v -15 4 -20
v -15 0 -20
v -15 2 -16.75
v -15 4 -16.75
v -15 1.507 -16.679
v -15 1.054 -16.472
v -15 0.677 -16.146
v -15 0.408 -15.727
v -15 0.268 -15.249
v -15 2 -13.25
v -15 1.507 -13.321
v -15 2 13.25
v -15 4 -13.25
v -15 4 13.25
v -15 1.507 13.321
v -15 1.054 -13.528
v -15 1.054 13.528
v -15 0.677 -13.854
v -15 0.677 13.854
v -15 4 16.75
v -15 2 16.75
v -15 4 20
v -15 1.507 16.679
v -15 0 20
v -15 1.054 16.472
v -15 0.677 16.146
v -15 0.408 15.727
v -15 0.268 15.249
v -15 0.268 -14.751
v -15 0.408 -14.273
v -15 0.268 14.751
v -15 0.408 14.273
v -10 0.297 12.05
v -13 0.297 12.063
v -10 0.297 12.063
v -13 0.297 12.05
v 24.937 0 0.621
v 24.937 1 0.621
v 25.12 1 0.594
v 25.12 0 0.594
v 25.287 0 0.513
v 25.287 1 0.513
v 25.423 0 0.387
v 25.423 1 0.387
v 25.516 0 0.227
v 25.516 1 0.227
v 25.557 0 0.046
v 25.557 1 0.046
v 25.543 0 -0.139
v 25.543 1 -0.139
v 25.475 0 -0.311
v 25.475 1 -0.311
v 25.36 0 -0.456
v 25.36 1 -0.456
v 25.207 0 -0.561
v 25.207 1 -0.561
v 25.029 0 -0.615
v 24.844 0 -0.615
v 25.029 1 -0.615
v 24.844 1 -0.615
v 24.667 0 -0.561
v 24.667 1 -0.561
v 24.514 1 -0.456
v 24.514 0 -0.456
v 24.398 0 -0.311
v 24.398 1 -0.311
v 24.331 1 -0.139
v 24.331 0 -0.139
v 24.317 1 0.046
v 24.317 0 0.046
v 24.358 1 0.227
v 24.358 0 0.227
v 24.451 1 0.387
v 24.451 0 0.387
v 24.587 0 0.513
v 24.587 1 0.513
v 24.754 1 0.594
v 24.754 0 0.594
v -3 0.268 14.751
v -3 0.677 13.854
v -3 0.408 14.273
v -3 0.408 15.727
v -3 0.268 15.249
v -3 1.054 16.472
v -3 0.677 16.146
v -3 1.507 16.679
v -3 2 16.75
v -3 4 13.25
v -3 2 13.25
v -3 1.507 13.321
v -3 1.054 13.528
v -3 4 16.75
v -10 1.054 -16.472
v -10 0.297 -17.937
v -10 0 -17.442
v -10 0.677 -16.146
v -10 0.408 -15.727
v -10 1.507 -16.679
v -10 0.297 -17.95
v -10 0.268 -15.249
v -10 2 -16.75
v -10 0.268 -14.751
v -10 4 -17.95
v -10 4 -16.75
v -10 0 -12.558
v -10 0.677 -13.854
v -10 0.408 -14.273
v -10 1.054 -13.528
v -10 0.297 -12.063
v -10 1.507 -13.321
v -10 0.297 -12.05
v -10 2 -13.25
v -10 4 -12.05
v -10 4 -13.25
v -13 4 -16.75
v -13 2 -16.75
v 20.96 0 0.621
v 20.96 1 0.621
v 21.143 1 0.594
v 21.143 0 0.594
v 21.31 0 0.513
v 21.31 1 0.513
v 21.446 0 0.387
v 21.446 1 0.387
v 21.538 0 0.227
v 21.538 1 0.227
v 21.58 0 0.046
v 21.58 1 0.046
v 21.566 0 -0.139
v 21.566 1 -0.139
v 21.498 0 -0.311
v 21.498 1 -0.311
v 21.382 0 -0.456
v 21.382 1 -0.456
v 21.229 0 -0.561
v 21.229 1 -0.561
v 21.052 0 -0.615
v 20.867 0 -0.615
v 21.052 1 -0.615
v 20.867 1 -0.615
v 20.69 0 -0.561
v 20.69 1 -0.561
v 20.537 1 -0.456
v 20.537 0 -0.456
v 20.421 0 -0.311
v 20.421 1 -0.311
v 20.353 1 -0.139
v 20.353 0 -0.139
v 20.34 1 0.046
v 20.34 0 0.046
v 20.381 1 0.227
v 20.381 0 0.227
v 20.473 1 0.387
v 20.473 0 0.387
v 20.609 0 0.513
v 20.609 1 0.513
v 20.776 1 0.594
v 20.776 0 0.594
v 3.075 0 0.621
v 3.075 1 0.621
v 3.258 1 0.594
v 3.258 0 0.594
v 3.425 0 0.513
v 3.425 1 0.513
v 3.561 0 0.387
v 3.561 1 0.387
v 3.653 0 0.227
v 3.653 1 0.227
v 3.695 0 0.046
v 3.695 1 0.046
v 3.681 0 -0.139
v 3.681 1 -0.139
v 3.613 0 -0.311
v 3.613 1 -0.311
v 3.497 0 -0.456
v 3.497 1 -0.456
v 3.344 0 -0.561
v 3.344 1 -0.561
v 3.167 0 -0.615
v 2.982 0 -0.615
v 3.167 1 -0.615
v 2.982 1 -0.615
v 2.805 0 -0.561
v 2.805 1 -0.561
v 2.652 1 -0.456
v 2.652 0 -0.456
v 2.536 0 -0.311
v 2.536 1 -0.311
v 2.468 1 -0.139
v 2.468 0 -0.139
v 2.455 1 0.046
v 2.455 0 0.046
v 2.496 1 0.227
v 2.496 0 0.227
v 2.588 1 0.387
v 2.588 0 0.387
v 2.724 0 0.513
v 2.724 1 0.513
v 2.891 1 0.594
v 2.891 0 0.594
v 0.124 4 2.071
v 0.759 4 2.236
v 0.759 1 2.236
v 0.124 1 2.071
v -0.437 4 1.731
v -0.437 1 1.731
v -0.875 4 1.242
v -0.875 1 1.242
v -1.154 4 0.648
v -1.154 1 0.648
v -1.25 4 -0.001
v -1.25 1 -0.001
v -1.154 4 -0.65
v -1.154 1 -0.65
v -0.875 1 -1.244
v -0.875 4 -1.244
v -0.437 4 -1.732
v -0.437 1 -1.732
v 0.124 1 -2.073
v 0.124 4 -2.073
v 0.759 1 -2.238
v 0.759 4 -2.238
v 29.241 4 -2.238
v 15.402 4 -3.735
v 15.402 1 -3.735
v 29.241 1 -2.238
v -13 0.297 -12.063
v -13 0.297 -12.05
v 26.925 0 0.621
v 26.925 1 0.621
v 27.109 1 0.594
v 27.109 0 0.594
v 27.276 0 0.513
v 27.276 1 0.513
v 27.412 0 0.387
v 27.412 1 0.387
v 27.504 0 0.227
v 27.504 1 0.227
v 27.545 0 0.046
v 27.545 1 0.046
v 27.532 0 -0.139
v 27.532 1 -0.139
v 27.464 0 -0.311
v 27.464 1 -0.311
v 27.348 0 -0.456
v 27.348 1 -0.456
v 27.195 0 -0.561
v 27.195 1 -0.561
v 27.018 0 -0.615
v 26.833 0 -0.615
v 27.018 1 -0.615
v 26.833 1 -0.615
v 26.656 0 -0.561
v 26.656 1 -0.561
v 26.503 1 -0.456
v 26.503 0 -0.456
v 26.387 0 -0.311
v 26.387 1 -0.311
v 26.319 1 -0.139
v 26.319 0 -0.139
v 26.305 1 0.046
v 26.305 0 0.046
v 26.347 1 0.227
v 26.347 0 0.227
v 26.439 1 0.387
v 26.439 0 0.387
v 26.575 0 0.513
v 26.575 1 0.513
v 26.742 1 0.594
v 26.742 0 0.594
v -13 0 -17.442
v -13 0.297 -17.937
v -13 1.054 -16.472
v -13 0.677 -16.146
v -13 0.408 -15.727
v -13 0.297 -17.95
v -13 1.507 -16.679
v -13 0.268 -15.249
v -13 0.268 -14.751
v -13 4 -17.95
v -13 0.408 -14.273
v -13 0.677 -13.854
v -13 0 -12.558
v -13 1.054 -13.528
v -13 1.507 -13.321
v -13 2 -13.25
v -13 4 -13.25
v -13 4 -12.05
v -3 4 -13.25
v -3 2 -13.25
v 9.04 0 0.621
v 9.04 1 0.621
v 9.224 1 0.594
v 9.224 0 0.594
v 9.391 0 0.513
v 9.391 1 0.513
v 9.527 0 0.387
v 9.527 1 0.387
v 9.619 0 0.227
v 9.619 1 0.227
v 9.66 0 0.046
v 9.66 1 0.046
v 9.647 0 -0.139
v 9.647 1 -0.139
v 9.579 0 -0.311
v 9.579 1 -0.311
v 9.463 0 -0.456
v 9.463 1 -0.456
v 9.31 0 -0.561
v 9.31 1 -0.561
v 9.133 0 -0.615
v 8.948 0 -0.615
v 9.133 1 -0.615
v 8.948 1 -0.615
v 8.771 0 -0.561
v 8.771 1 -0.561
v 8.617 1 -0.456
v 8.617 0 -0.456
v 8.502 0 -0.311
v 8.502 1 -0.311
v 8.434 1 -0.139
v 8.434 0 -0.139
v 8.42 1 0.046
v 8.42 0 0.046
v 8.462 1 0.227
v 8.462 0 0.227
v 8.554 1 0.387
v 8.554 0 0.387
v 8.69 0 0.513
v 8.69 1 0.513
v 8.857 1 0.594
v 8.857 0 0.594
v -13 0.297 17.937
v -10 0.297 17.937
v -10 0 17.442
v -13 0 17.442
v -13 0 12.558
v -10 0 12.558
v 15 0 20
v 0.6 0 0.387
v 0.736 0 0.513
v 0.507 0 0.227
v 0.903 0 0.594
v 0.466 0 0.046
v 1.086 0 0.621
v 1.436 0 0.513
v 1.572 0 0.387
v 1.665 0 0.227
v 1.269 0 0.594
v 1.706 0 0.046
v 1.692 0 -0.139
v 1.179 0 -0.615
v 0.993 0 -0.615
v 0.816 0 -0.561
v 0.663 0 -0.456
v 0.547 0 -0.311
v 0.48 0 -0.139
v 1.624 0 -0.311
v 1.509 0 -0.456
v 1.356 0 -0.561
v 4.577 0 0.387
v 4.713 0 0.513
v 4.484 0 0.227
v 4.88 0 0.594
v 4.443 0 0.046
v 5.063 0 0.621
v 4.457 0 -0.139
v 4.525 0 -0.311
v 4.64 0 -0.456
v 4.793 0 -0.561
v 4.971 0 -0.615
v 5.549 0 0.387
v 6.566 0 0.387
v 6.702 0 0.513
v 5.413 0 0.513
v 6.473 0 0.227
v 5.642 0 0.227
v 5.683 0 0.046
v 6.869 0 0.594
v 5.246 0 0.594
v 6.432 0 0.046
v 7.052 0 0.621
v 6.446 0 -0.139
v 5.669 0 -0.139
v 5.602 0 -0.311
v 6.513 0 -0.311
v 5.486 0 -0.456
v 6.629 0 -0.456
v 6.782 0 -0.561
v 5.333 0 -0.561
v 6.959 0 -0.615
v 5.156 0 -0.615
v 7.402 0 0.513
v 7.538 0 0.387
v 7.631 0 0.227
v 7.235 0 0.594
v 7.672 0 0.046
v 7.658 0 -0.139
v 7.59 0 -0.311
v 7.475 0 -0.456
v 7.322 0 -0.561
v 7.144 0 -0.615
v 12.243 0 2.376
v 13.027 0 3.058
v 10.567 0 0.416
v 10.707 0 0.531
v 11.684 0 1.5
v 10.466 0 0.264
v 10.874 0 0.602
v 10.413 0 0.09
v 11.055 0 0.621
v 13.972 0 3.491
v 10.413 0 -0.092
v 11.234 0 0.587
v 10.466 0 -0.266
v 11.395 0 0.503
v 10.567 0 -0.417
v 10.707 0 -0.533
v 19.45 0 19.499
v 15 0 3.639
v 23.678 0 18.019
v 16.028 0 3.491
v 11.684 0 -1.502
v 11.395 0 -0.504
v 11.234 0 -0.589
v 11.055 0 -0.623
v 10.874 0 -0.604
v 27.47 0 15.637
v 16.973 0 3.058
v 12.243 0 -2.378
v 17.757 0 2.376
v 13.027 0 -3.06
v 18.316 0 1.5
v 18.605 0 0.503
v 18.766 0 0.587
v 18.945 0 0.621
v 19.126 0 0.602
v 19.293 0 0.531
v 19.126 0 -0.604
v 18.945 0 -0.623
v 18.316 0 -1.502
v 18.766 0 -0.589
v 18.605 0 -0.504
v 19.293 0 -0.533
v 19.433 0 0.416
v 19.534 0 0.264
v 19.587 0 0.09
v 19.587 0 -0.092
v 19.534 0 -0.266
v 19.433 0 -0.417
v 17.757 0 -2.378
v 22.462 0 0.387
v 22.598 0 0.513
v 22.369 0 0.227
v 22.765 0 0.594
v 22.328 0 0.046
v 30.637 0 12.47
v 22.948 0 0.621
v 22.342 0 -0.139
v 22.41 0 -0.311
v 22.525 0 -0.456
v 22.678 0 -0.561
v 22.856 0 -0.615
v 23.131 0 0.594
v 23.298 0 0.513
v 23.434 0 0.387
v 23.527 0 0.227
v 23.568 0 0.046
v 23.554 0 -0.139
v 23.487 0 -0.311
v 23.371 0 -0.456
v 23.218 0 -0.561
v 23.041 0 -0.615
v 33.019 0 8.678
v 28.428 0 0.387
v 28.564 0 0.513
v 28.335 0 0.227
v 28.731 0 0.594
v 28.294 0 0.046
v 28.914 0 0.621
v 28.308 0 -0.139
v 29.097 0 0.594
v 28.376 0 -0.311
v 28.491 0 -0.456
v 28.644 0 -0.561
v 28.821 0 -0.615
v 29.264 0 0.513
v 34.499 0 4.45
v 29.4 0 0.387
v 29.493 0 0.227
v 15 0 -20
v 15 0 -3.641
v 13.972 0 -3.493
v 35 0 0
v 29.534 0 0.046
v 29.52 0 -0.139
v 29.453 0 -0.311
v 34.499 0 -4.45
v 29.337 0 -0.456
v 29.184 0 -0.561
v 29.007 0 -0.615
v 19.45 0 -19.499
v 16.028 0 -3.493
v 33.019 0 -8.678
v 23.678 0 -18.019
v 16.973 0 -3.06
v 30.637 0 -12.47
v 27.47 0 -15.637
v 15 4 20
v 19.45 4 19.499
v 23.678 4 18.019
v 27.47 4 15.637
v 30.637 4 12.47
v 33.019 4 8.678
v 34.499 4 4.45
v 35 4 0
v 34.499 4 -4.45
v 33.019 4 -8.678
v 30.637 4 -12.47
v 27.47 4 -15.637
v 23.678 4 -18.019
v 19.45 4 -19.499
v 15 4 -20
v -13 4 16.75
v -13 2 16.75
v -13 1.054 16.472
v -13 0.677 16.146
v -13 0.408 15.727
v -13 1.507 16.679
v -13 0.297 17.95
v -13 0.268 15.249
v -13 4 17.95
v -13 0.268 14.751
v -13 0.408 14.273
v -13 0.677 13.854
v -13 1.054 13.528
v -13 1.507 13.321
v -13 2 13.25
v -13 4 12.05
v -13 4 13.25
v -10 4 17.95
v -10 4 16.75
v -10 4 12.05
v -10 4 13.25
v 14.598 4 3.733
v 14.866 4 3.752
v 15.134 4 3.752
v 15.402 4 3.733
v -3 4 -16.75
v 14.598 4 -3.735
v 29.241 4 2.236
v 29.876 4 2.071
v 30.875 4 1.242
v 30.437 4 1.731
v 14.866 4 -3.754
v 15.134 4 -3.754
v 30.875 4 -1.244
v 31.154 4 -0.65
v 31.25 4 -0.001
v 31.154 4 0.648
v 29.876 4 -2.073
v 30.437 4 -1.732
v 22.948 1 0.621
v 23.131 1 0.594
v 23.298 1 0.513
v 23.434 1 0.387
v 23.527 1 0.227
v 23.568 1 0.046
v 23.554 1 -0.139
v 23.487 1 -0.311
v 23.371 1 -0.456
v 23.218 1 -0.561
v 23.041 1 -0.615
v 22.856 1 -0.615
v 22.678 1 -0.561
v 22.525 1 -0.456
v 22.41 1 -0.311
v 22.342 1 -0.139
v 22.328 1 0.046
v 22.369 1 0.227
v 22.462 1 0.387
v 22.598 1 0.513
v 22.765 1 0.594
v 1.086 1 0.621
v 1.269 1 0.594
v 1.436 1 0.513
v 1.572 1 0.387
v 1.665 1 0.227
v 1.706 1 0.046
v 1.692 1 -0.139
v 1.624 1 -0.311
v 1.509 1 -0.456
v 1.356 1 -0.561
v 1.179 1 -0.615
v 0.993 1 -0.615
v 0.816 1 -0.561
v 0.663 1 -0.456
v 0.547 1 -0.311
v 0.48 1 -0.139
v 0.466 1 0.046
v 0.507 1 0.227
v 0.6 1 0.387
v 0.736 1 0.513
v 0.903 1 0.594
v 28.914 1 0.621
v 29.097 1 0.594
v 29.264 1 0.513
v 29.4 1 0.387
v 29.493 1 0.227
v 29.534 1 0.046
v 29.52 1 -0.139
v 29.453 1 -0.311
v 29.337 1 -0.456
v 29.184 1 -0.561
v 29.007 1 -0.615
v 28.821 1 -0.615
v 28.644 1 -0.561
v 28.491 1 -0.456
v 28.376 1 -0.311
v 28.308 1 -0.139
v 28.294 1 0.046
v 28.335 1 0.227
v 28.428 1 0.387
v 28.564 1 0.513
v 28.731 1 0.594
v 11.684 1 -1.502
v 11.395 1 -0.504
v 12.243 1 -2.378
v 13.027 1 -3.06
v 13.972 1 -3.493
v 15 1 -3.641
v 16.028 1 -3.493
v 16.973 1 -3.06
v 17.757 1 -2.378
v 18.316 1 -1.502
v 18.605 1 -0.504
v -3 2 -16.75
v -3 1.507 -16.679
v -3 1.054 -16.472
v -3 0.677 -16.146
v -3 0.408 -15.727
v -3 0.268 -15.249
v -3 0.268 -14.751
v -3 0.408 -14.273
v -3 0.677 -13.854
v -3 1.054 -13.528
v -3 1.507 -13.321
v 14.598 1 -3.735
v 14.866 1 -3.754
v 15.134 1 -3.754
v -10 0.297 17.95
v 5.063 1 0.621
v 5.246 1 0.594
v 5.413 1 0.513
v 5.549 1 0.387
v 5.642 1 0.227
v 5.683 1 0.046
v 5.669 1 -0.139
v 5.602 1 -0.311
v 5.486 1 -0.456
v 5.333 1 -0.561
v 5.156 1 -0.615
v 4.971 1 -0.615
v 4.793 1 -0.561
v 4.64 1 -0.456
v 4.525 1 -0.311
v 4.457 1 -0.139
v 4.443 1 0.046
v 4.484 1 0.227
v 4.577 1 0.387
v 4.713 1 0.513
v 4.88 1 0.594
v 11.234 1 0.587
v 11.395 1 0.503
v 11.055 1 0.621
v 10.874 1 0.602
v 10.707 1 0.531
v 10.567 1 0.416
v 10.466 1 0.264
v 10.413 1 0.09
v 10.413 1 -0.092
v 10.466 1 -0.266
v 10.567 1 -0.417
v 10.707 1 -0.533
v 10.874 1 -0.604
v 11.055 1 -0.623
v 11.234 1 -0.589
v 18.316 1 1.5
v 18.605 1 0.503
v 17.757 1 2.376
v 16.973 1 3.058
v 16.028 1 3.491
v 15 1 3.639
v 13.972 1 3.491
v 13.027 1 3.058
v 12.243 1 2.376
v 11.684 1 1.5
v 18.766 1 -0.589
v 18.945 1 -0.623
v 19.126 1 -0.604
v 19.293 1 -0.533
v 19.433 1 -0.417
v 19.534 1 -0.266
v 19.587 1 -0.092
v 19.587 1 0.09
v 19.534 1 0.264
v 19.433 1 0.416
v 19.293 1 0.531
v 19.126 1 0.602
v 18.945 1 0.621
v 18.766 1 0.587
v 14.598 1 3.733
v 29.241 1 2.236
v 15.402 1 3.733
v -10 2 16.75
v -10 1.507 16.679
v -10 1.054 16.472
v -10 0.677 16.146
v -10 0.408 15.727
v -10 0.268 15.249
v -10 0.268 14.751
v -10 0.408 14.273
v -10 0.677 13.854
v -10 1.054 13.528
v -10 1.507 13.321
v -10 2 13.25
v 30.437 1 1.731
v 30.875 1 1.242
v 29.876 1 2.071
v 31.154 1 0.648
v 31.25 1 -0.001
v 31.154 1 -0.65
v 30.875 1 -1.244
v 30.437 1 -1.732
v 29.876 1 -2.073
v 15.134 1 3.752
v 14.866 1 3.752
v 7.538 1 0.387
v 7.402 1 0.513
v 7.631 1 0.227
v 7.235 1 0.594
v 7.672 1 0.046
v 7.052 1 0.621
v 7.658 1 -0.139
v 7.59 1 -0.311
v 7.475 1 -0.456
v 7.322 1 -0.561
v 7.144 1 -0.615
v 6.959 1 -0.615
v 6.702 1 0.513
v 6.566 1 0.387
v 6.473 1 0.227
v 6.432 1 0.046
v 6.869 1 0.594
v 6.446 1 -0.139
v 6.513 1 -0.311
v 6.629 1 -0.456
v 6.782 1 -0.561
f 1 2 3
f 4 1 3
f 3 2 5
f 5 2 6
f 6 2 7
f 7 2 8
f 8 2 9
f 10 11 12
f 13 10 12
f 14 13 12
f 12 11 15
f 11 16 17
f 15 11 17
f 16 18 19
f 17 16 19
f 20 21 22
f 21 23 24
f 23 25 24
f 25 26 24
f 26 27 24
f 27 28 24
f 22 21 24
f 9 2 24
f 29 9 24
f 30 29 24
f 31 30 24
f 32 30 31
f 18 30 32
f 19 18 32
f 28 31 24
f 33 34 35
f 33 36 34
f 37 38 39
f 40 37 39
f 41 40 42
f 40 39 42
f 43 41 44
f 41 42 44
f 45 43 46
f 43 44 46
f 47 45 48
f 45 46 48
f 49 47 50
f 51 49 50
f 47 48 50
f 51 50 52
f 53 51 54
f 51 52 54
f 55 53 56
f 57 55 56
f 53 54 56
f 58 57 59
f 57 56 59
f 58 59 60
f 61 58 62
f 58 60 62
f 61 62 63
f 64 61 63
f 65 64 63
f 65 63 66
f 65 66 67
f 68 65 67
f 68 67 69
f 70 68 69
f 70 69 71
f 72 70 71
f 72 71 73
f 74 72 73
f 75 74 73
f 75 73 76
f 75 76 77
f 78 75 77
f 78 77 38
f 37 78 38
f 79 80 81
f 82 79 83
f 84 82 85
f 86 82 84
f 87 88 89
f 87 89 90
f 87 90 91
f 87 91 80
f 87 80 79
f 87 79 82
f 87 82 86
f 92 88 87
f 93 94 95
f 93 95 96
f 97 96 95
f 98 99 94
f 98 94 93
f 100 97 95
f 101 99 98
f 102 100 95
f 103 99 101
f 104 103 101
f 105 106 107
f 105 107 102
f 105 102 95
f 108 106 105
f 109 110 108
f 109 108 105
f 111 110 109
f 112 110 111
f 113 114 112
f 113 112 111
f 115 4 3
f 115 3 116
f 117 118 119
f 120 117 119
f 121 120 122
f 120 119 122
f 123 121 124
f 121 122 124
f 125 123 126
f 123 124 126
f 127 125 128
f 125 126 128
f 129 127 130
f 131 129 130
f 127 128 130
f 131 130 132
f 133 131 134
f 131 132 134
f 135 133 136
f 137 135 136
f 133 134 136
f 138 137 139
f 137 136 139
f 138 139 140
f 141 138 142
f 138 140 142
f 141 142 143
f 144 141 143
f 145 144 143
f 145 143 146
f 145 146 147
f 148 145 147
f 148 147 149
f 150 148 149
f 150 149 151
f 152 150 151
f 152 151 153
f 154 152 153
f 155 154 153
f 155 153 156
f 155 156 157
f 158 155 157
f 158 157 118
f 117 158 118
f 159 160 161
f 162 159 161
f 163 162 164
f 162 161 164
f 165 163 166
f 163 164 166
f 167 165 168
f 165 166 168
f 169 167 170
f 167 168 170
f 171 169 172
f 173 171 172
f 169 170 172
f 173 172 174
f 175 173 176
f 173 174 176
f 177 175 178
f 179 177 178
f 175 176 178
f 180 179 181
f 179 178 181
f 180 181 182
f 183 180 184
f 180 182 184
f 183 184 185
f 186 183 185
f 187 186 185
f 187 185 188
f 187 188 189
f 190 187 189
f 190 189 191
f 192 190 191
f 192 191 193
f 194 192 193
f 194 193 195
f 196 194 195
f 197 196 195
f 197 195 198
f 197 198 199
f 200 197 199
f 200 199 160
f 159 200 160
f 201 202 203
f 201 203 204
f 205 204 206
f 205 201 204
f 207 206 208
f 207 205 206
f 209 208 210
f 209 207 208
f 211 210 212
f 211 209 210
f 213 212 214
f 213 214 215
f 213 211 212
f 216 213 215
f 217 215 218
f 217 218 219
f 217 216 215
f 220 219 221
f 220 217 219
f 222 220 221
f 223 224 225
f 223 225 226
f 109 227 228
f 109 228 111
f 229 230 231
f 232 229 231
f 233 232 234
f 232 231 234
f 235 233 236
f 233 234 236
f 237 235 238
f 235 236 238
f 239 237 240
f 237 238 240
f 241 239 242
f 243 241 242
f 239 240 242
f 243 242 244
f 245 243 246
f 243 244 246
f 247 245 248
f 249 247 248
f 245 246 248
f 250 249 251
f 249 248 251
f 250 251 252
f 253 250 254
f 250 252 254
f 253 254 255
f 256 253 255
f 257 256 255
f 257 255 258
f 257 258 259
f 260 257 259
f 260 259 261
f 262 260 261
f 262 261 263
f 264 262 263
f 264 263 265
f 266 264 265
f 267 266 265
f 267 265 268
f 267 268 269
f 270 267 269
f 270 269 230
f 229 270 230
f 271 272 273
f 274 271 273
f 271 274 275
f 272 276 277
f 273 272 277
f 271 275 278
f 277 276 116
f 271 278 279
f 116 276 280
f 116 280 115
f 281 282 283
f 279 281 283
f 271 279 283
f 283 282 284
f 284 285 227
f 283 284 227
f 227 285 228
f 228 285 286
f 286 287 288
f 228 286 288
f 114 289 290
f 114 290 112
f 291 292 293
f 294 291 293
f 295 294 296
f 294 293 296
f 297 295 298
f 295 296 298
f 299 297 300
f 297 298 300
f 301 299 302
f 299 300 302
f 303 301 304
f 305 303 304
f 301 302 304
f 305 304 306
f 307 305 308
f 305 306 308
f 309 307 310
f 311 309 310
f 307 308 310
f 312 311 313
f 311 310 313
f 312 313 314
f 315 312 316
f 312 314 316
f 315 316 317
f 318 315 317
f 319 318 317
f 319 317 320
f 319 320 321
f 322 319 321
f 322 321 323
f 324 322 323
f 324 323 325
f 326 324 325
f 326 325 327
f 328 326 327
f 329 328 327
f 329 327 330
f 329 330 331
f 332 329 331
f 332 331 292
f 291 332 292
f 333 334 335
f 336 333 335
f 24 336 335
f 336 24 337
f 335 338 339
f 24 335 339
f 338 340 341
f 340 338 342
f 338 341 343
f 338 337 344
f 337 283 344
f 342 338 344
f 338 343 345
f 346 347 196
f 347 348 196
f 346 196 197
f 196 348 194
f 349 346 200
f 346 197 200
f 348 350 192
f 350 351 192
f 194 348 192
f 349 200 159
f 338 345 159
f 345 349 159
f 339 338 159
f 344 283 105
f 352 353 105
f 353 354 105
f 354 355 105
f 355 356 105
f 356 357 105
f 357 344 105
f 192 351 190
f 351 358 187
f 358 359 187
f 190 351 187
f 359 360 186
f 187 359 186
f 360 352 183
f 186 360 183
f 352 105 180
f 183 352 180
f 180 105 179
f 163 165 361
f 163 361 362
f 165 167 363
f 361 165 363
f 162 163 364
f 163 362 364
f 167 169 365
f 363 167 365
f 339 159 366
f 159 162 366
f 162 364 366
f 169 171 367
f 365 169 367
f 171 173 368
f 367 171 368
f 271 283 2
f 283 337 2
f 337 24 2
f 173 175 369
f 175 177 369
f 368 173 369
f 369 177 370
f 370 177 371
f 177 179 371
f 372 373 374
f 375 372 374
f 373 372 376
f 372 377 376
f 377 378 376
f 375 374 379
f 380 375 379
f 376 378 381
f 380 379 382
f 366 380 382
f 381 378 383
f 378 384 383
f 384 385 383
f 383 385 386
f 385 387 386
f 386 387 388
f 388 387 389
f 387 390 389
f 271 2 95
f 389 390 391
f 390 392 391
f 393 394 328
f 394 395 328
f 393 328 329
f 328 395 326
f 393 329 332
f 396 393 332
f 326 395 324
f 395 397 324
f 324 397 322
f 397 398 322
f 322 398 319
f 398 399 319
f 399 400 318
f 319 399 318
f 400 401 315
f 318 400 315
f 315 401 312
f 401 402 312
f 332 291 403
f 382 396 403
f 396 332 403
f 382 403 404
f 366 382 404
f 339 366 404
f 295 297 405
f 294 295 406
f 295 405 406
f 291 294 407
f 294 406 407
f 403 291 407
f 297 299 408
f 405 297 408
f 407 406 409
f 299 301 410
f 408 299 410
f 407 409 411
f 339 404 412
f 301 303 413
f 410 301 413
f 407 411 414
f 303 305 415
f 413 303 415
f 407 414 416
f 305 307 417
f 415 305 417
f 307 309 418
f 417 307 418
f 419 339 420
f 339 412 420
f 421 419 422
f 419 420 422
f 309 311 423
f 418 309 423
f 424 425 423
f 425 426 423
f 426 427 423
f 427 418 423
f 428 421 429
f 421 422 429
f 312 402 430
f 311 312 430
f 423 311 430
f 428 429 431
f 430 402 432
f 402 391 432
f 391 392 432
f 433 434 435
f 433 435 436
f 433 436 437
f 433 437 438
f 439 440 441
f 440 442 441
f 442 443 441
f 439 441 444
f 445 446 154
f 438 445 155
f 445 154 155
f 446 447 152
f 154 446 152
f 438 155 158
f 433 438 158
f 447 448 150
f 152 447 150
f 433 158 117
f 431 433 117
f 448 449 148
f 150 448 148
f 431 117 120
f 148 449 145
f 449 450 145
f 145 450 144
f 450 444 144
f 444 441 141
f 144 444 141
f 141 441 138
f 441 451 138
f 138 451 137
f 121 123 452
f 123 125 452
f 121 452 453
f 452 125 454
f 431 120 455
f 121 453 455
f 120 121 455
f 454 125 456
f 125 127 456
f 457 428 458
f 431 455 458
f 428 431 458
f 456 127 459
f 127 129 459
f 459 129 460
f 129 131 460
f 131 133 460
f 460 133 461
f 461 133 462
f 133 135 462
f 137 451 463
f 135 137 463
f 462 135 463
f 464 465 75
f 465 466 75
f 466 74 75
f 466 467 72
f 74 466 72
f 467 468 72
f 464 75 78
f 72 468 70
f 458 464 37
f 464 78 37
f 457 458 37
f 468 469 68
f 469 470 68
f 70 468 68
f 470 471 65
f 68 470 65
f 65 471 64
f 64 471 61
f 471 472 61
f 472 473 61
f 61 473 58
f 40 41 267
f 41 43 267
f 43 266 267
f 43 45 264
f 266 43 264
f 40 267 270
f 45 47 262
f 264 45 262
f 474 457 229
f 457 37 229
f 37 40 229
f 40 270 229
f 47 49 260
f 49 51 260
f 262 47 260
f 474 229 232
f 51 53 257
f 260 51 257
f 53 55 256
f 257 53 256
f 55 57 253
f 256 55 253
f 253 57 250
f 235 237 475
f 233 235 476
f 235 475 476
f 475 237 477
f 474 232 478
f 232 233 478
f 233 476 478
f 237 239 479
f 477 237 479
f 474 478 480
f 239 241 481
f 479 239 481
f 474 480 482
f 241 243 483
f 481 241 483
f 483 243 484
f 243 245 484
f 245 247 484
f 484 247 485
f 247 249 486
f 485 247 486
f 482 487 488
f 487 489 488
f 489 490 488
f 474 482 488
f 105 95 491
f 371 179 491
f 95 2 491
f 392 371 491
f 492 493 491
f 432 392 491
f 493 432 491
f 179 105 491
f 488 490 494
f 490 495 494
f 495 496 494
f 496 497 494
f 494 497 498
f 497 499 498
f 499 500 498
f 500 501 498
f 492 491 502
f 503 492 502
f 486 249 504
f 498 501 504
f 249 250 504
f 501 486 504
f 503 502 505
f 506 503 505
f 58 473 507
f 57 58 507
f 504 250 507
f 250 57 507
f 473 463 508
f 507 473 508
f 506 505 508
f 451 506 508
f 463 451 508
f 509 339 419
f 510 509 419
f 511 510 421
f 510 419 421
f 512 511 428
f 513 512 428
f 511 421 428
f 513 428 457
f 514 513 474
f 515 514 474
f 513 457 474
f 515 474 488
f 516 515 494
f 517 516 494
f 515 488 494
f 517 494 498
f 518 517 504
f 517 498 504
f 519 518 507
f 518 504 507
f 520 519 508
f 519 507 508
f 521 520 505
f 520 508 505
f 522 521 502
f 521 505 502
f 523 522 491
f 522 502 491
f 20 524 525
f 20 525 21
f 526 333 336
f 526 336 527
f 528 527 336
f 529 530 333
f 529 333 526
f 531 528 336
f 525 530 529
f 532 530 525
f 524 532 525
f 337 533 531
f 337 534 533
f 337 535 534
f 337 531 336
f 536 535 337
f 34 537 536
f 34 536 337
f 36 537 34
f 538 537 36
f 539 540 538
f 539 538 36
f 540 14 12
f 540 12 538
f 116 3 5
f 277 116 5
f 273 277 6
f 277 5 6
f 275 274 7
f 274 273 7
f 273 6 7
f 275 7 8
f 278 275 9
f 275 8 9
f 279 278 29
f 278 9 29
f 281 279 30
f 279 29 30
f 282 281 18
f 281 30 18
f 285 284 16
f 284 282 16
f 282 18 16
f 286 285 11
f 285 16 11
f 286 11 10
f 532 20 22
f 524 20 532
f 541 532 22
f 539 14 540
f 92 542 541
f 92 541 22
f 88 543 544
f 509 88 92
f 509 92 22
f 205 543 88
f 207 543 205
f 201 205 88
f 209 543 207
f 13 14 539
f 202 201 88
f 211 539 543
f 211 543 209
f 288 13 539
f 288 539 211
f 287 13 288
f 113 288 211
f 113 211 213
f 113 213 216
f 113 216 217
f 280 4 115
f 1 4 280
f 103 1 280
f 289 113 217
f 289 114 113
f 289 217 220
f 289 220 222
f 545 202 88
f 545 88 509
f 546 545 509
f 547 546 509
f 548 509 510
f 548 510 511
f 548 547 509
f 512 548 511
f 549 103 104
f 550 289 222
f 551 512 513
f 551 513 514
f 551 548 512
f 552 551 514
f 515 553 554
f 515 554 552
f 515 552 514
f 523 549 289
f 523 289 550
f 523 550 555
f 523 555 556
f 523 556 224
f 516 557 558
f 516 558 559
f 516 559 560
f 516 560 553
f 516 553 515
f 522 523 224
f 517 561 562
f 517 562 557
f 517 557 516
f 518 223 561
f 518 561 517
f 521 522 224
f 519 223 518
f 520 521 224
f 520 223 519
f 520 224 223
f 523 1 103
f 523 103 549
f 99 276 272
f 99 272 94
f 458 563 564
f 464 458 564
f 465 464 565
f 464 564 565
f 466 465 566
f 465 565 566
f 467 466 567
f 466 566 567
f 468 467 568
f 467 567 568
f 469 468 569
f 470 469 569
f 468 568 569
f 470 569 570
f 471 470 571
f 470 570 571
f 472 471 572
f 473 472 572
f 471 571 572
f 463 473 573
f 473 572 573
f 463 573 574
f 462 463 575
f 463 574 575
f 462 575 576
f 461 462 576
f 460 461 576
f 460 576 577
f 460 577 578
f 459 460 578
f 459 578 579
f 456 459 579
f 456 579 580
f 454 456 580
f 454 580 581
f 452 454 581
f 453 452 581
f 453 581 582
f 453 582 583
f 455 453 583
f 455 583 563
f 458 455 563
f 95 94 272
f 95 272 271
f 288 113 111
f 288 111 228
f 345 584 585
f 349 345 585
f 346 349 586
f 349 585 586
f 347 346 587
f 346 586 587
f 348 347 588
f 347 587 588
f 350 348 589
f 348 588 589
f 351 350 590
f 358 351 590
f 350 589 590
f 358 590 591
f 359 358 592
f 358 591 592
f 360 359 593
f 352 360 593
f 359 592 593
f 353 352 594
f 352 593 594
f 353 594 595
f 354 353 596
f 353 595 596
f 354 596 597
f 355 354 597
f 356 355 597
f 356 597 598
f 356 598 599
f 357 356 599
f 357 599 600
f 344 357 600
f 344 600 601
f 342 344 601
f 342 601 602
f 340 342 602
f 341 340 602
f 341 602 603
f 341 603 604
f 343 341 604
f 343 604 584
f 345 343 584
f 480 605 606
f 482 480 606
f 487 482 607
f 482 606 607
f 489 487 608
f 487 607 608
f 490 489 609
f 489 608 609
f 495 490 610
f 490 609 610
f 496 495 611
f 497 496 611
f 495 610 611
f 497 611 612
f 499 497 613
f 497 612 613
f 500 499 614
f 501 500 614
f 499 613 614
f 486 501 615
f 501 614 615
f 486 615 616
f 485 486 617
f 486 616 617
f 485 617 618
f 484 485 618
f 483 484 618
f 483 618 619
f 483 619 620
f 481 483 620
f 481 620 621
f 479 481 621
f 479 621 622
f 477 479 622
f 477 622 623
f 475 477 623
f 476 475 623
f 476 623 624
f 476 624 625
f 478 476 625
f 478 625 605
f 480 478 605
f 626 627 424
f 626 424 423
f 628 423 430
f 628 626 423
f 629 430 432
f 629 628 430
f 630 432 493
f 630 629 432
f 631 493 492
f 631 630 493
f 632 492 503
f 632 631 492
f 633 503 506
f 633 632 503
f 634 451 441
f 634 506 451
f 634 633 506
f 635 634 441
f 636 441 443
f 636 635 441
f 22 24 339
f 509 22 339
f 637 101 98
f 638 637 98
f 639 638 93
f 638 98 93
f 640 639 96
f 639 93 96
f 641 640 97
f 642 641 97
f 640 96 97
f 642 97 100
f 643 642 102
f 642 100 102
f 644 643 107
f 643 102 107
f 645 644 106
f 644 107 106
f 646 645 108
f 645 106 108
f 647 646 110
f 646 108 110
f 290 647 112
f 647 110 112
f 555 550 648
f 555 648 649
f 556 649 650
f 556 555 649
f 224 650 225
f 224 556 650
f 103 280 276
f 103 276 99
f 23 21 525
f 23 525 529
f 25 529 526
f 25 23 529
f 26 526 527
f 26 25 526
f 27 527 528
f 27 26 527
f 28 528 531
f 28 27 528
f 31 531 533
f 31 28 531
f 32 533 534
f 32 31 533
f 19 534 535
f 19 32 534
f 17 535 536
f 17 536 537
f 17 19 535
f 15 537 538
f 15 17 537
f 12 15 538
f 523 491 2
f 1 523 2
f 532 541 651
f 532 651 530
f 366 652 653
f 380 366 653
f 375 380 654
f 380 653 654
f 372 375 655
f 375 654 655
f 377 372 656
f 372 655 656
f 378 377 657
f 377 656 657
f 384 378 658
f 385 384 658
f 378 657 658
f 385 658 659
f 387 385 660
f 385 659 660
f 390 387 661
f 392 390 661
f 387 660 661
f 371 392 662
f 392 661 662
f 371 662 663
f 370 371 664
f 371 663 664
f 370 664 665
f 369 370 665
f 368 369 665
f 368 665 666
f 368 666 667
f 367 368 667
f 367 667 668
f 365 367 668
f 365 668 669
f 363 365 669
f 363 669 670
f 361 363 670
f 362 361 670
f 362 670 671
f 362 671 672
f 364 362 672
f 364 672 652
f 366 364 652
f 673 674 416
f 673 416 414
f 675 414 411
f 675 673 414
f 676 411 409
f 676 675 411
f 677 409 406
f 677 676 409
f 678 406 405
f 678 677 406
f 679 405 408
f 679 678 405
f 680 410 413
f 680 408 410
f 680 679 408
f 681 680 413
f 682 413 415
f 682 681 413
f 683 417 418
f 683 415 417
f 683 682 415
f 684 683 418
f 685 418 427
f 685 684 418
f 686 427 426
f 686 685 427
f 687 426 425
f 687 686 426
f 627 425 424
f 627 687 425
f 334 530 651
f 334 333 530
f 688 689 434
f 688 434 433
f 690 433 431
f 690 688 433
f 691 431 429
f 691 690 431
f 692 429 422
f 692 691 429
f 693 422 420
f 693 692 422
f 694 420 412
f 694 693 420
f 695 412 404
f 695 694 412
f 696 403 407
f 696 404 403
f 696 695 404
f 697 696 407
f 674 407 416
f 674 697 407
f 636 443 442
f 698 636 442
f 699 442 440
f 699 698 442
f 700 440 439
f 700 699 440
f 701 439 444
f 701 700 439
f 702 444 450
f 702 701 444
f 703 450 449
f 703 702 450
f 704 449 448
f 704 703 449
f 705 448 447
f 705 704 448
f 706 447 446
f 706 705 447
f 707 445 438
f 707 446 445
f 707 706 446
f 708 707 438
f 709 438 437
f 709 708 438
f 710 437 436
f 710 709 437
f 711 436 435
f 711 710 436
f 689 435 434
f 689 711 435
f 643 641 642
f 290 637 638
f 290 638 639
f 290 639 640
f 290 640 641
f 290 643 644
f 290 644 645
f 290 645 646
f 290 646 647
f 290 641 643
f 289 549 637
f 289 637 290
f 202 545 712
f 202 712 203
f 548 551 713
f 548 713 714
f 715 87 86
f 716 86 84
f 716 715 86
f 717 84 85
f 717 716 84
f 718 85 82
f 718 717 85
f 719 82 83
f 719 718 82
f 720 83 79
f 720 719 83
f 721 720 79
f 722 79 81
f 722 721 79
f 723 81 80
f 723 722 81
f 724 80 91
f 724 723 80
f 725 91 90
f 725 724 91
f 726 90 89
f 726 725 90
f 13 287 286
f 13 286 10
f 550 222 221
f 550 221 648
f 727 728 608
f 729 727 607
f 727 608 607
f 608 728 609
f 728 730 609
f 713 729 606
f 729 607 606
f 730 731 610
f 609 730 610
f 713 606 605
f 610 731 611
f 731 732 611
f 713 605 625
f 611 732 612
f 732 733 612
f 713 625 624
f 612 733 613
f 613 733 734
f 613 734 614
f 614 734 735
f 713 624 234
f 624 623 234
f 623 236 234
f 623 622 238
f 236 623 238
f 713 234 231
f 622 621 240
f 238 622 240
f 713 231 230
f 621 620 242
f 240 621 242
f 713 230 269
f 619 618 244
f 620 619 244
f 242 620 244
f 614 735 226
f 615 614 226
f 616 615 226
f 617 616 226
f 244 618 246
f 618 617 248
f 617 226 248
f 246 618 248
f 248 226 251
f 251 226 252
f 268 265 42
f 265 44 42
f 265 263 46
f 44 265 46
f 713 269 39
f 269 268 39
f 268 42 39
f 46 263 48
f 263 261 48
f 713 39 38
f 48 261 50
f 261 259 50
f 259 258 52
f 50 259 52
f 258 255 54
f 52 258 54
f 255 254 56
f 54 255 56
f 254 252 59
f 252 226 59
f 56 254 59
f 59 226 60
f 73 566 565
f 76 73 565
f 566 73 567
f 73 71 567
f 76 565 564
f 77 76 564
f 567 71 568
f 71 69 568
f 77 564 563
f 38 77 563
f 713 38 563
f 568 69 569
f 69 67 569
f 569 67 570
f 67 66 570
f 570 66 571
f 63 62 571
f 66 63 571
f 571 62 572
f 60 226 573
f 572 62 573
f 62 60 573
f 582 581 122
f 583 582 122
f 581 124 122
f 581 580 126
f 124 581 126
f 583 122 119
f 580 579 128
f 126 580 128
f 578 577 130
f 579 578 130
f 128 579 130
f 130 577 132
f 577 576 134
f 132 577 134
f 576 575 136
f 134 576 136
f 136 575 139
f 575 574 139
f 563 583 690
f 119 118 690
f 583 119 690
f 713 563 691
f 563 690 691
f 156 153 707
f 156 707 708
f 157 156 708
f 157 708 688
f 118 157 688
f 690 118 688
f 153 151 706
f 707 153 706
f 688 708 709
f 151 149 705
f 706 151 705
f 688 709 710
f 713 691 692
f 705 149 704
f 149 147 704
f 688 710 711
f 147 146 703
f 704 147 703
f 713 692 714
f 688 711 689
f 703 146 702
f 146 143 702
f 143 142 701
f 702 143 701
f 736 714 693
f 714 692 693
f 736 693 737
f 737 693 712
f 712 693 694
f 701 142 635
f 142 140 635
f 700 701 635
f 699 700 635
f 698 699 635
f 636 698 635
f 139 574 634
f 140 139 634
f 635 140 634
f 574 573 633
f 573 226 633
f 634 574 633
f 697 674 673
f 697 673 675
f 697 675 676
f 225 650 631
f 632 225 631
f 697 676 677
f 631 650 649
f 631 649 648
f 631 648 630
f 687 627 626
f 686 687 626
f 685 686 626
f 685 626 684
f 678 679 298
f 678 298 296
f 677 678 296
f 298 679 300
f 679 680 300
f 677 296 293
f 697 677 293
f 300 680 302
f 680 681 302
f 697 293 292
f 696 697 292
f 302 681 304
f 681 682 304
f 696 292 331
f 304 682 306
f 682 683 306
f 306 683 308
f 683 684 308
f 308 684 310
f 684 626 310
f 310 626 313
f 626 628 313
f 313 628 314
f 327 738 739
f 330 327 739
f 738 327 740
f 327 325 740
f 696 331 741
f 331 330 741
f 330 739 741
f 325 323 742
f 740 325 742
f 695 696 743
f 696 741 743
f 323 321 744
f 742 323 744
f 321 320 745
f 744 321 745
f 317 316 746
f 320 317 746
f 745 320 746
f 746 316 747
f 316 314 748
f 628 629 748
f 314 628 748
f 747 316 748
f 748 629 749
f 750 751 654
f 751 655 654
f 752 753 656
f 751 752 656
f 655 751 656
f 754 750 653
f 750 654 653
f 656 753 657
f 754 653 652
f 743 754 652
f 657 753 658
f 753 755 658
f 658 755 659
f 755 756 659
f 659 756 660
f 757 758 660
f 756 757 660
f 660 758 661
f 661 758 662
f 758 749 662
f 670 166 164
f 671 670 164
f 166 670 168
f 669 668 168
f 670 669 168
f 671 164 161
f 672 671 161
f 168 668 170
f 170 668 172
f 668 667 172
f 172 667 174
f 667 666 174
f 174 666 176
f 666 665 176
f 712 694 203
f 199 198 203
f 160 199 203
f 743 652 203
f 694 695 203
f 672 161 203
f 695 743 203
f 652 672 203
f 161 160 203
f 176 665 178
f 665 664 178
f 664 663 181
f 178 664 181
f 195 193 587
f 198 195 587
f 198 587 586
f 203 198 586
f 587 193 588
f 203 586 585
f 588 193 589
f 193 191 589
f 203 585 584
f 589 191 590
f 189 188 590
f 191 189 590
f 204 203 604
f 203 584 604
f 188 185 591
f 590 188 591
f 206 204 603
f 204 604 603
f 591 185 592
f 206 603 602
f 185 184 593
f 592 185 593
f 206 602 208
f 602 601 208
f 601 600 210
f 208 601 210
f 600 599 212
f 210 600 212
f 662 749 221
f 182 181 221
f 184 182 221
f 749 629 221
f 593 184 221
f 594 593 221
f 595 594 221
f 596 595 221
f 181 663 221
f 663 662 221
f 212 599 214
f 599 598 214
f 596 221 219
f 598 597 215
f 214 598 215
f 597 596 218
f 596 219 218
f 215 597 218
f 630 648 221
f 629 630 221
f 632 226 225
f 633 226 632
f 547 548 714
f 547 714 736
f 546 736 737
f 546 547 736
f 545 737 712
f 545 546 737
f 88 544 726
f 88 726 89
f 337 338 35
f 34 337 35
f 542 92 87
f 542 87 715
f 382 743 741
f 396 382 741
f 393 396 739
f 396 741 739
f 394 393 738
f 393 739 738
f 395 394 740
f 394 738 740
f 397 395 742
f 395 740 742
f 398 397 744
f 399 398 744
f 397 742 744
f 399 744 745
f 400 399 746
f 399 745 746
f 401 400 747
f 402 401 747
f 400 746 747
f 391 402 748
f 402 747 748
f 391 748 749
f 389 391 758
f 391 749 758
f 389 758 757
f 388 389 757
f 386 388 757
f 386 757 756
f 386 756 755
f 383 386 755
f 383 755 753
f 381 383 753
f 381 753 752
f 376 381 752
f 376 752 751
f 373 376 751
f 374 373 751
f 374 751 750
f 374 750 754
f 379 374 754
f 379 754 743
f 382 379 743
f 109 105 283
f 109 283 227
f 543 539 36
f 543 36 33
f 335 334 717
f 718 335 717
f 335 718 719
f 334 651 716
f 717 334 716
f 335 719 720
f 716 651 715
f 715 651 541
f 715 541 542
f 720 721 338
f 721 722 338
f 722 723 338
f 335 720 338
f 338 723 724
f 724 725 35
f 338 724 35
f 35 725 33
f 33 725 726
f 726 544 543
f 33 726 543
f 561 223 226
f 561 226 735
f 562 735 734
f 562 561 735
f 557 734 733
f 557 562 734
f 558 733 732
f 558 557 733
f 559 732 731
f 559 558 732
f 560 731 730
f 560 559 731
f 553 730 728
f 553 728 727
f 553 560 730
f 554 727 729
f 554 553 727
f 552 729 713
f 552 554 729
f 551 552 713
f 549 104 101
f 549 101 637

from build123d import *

# Parameters (mm, degrees)
BOSS_EXTRUDE1_DEPTH = 3.999992
CUT_EXTRUDE1_DEPTH  = 1.999996
CUT_EXTRUDE2_REACH  = 56
CUT_EXTRUDE3_DEPTH  = 3.703193
CUT_EXTRUDE4_DEPTH  = 2.999994
SKETCH6_R           = 0.621776252
CUT_EXTRUDE5_DEPTH  = 41.509250857
CUT_EXTRUDE6_DEPTH  = 2.999994


with BuildPart() as part:
    # Sketch1 → Boss-Extrude1 (new body)
    with BuildSketch(Plane(origin=(0, 0, 0), x_dir=(1, 0, 0), z_dir=(0, 1, 0))):
        with BuildLine():
            Line((-14.9999954, -19.9999981), (14.9999954, -19.9999981))
            ThreePointArc((14.9999954, -19.9999981), (34.9999935, 0), (14.9999954, 19.9999981))
            Line((14.9999954, 19.9999981), (-14.9999954, 19.9999981))
            Line((-14.9999954, 19.9999981), (-14.9999954, -19.9999981))
        make_face()
    extrude(amount=BOSS_EXTRUDE1_DEPTH)

    # Sketch2 → Cut-Extrude1 (cut)
    with BuildSketch(Plane(origin=(0, 3.999992, 0), x_dir=(1, 0, 0), z_dir=(0, 1, 0))):
        Polygon((-14.9999954, -16.7499919), (-14.9999954, -13.2499989), (-12.9999994, -13.2499989), (-12.9999994, -12.0500013), (-10.0000054, -12.0500013), (-10.0000054, -13.2499989), (-2.999994, -13.2499989), (-2.999994, -16.7499919), (-10.0000054, -16.7499919), (-10.0000054, -17.9499895), (-12.9999994, -17.9499895), (-12.9999994, -16.7499919), align=None)
        Polygon((-14.9999954, 16.7499919), (-12.9999994, 16.7499919), (-12.9999994, 17.9499895), (-10.0000054, 17.9499895), (-10.0000054, 16.7499919), (-2.999994, 16.7499919), (-2.999994, 13.2499989), (-10.0000054, 13.2499989), (-10.0000054, 12.0500013), (-12.9999994, 12.0500013), (-12.9999994, 13.2499989), (-14.9999954, 13.2499989), align=None)
    extrude(amount=-CUT_EXTRUDE1_DEPTH, mode=Mode.SUBTRACT)

    # Cut-Extrude2: up to this face of the body (flat: up to its plane)
    cut_extrude2_end = Plane(part.part.faces().sort_by_distance((-2.999994, 2.999994, -14.9999954))[0])
    # Sketch3 → Cut-Extrude2 (cut, up to the picked face)
    with BuildSketch(Plane.ZY.offset(14.9999954), mode=Mode.PRIVATE) as cut_extrude2_sk1:
        with BuildLine():
            Line((13.2499989, 1.999996), (16.7499919, 1.999996))
            ThreePointArc((16.7499919, 1.999996), (14.9999954, 0.2499995), (13.2499989, 1.999996))
        make_face()
    cut_extrude2_tool1 = split(extrude(cut_extrude2_sk1.sketch, amount=-CUT_EXTRUDE2_REACH, mode=Mode.PRIVATE), bisect_by=cut_extrude2_end, keep=Keep.BOTH, mode=Mode.PRIVATE)
    # Sketch3 → Cut-Extrude2 (cut, up to the picked face)
    with BuildSketch(Plane.ZY.offset(14.9999954), mode=Mode.PRIVATE) as cut_extrude2_sk2:
        with BuildLine():
            Line((-13.2499989, 1.999996), (-16.7499919, 1.999996))
            ThreePointArc((-16.7499919, 1.999996), (-14.9999954, 0.2499995), (-13.2499989, 1.999996))
        make_face()
    cut_extrude2_tool2 = split(extrude(cut_extrude2_sk2.sketch, amount=-CUT_EXTRUDE2_REACH, mode=Mode.PRIVATE), bisect_by=cut_extrude2_end, keep=Keep.BOTH, mode=Mode.PRIVATE)
    add(cut_extrude2_tool1.solids().sort_by(Axis((-14.999995, 1.257274, 14.999995), (1, 0, 0)))[0], mode=Mode.SUBTRACT)
    add(cut_extrude2_tool2.solids().sort_by(Axis((-14.999995, 1.257274, -14.999995), (1, 0, 0)))[0], mode=Mode.SUBTRACT)

    # Sketch4 → Cut-Extrude3 (cut)
    with BuildSketch(Plane(origin=(0, 3.999992, 0), x_dir=(1, 0, 0), z_dir=(0, 1, 0))):
        Polygon((-12.9999994, 13.2499989), (-12.9999994, 12.0500013), (-10.0000054, 12.0500013), (-10.0000054, 13.2499989), (-10.0000054, 16.7499919), (-10.0000054, 17.9499895), (-12.9999994, 17.9499895), (-12.9999994, 16.7499919), align=None)
        Polygon((-10.0000054, -16.7499919), (-10.0000054, -13.2499989), (-10.0000054, -12.0500013), (-12.9999994, -12.0500013), (-12.9999994, -13.2499989), (-12.9999994, -16.7499919), (-12.9999994, -17.9499895), (-10.0000054, -17.9499895), align=None)
    extrude(amount=-CUT_EXTRUDE3_DEPTH, mode=Mode.SUBTRACT)

    # Sketch5 → Cut-Extrude4 (cut)
    with BuildSketch(Plane.ZY.offset(10.0000054)):
        Polygon((-17.4419895, 0), (-12.5580013, 0), (-12.0500013, 0.3048), (-17.9499895, 0.3048), align=None)
        Polygon((12.5580013, 0), (12.0500013, 0.3048), (17.9499895, 0.3048), (17.4419895, 0), align=None)
    extrude(amount=CUT_EXTRUDE4_DEPTH, mode=Mode.SUBTRACT)

    # Sketch6 → Cut-Extrude5 (cut, through all)
    with BuildSketch(Plane(origin=(0, 3.999992, 0), x_dir=(1, 0, 0), z_dir=(0, 1, 0))):
        with BuildLine():
            ThreePointArc((18.60506983, 0.504260657), (19.593270199, 0.000879919), (18.60506983, -0.502500819))
            ThreePointArc((18.60506983, -0.502500819), (14.9999954, -3.639168681), (11.39492097, -0.502500819))
            ThreePointArc((11.39492097, -0.502500819), (10.406720601, 0.000879919), (11.39492097, 0.504260657))
            ThreePointArc((11.39492097, 0.504260657), (14.9999954, 3.640928519), (18.60506983, 0.504260657))
        make_face()
        with Locations(Location((9.040415251, 0.000347085, 0), (0, 0, 270))):
            Circle(SKETCH6_R)
        with Locations(Location((7.051800737, 0.000347085, 0), (0, 0, 270))):
            Circle(SKETCH6_R)
        with Locations(Location((5.063186223, 0.000347085, 0), (0, 0, 270))):
            Circle(SKETCH6_R)
        with Locations(Location((3.074571709, 0.000347085, 0), (0, 0, 270))):
            Circle(SKETCH6_R)
        with Locations(Location((1.085957195, 0.000347085, 0), (0, 0, 270))):
            Circle(SKETCH6_R)
        with Locations(Location((20.959575549, 0.000347085, 0), (0, 0, 270))):
            Circle(SKETCH6_R)
        with Locations(Location((22.948190063, 0.000347085, 0), (0, 0, 270))):
            Circle(SKETCH6_R)
        with Locations(Location((24.936804577, 0.000347085, 0), (0, 0, 270))):
            Circle(SKETCH6_R)
        with Locations(Location((26.925419091, 0.000347085, 0), (0, 0, 270))):
            Circle(SKETCH6_R)
        with Locations(Location((28.914033605, 0.000347085, 0), (0, 0, 270))):
            Circle(SKETCH6_R)
    extrude(amount=-CUT_EXTRUDE5_DEPTH, mode=Mode.SUBTRACT)

    # Sketch7 → Cut-Extrude6 (cut)
    with BuildSketch(Plane(origin=(0, 3.999992, 0), x_dir=(1, 0, 0), z_dir=(0, 1, 0))):
        with BuildLine():
            Line((0.7589266, 2.237934119), (14.5982182, 3.734679919))
            ThreePointArc((14.5982182, 3.734679919), (14.9999954, 3.75634324), (15.4017726, 3.734679919))
            Line((15.4017726, 3.734679919), (29.2410642, 2.237934119))
            ThreePointArc((29.2410642, 2.237934119), (31.249997536, 0.000879919), (29.2410642, -2.236174281))
            Line((29.2410642, -2.236174281), (15.4017726, -3.732920081))
            ThreePointArc((15.4017726, -3.732920081), (14.9999954, -3.754583403), (14.5982182, -3.732920081))
            Line((14.5982182, -3.732920081), (0.7589266, -2.236174281))
            ThreePointArc((0.7589266, -2.236174281), (-1.250006736, 0.000879919), (0.7589266, 2.237934119))
        make_face()
    extrude(amount=-CUT_EXTRUDE6_DEPTH, mode=Mode.SUBTRACT)


solid = part.part
